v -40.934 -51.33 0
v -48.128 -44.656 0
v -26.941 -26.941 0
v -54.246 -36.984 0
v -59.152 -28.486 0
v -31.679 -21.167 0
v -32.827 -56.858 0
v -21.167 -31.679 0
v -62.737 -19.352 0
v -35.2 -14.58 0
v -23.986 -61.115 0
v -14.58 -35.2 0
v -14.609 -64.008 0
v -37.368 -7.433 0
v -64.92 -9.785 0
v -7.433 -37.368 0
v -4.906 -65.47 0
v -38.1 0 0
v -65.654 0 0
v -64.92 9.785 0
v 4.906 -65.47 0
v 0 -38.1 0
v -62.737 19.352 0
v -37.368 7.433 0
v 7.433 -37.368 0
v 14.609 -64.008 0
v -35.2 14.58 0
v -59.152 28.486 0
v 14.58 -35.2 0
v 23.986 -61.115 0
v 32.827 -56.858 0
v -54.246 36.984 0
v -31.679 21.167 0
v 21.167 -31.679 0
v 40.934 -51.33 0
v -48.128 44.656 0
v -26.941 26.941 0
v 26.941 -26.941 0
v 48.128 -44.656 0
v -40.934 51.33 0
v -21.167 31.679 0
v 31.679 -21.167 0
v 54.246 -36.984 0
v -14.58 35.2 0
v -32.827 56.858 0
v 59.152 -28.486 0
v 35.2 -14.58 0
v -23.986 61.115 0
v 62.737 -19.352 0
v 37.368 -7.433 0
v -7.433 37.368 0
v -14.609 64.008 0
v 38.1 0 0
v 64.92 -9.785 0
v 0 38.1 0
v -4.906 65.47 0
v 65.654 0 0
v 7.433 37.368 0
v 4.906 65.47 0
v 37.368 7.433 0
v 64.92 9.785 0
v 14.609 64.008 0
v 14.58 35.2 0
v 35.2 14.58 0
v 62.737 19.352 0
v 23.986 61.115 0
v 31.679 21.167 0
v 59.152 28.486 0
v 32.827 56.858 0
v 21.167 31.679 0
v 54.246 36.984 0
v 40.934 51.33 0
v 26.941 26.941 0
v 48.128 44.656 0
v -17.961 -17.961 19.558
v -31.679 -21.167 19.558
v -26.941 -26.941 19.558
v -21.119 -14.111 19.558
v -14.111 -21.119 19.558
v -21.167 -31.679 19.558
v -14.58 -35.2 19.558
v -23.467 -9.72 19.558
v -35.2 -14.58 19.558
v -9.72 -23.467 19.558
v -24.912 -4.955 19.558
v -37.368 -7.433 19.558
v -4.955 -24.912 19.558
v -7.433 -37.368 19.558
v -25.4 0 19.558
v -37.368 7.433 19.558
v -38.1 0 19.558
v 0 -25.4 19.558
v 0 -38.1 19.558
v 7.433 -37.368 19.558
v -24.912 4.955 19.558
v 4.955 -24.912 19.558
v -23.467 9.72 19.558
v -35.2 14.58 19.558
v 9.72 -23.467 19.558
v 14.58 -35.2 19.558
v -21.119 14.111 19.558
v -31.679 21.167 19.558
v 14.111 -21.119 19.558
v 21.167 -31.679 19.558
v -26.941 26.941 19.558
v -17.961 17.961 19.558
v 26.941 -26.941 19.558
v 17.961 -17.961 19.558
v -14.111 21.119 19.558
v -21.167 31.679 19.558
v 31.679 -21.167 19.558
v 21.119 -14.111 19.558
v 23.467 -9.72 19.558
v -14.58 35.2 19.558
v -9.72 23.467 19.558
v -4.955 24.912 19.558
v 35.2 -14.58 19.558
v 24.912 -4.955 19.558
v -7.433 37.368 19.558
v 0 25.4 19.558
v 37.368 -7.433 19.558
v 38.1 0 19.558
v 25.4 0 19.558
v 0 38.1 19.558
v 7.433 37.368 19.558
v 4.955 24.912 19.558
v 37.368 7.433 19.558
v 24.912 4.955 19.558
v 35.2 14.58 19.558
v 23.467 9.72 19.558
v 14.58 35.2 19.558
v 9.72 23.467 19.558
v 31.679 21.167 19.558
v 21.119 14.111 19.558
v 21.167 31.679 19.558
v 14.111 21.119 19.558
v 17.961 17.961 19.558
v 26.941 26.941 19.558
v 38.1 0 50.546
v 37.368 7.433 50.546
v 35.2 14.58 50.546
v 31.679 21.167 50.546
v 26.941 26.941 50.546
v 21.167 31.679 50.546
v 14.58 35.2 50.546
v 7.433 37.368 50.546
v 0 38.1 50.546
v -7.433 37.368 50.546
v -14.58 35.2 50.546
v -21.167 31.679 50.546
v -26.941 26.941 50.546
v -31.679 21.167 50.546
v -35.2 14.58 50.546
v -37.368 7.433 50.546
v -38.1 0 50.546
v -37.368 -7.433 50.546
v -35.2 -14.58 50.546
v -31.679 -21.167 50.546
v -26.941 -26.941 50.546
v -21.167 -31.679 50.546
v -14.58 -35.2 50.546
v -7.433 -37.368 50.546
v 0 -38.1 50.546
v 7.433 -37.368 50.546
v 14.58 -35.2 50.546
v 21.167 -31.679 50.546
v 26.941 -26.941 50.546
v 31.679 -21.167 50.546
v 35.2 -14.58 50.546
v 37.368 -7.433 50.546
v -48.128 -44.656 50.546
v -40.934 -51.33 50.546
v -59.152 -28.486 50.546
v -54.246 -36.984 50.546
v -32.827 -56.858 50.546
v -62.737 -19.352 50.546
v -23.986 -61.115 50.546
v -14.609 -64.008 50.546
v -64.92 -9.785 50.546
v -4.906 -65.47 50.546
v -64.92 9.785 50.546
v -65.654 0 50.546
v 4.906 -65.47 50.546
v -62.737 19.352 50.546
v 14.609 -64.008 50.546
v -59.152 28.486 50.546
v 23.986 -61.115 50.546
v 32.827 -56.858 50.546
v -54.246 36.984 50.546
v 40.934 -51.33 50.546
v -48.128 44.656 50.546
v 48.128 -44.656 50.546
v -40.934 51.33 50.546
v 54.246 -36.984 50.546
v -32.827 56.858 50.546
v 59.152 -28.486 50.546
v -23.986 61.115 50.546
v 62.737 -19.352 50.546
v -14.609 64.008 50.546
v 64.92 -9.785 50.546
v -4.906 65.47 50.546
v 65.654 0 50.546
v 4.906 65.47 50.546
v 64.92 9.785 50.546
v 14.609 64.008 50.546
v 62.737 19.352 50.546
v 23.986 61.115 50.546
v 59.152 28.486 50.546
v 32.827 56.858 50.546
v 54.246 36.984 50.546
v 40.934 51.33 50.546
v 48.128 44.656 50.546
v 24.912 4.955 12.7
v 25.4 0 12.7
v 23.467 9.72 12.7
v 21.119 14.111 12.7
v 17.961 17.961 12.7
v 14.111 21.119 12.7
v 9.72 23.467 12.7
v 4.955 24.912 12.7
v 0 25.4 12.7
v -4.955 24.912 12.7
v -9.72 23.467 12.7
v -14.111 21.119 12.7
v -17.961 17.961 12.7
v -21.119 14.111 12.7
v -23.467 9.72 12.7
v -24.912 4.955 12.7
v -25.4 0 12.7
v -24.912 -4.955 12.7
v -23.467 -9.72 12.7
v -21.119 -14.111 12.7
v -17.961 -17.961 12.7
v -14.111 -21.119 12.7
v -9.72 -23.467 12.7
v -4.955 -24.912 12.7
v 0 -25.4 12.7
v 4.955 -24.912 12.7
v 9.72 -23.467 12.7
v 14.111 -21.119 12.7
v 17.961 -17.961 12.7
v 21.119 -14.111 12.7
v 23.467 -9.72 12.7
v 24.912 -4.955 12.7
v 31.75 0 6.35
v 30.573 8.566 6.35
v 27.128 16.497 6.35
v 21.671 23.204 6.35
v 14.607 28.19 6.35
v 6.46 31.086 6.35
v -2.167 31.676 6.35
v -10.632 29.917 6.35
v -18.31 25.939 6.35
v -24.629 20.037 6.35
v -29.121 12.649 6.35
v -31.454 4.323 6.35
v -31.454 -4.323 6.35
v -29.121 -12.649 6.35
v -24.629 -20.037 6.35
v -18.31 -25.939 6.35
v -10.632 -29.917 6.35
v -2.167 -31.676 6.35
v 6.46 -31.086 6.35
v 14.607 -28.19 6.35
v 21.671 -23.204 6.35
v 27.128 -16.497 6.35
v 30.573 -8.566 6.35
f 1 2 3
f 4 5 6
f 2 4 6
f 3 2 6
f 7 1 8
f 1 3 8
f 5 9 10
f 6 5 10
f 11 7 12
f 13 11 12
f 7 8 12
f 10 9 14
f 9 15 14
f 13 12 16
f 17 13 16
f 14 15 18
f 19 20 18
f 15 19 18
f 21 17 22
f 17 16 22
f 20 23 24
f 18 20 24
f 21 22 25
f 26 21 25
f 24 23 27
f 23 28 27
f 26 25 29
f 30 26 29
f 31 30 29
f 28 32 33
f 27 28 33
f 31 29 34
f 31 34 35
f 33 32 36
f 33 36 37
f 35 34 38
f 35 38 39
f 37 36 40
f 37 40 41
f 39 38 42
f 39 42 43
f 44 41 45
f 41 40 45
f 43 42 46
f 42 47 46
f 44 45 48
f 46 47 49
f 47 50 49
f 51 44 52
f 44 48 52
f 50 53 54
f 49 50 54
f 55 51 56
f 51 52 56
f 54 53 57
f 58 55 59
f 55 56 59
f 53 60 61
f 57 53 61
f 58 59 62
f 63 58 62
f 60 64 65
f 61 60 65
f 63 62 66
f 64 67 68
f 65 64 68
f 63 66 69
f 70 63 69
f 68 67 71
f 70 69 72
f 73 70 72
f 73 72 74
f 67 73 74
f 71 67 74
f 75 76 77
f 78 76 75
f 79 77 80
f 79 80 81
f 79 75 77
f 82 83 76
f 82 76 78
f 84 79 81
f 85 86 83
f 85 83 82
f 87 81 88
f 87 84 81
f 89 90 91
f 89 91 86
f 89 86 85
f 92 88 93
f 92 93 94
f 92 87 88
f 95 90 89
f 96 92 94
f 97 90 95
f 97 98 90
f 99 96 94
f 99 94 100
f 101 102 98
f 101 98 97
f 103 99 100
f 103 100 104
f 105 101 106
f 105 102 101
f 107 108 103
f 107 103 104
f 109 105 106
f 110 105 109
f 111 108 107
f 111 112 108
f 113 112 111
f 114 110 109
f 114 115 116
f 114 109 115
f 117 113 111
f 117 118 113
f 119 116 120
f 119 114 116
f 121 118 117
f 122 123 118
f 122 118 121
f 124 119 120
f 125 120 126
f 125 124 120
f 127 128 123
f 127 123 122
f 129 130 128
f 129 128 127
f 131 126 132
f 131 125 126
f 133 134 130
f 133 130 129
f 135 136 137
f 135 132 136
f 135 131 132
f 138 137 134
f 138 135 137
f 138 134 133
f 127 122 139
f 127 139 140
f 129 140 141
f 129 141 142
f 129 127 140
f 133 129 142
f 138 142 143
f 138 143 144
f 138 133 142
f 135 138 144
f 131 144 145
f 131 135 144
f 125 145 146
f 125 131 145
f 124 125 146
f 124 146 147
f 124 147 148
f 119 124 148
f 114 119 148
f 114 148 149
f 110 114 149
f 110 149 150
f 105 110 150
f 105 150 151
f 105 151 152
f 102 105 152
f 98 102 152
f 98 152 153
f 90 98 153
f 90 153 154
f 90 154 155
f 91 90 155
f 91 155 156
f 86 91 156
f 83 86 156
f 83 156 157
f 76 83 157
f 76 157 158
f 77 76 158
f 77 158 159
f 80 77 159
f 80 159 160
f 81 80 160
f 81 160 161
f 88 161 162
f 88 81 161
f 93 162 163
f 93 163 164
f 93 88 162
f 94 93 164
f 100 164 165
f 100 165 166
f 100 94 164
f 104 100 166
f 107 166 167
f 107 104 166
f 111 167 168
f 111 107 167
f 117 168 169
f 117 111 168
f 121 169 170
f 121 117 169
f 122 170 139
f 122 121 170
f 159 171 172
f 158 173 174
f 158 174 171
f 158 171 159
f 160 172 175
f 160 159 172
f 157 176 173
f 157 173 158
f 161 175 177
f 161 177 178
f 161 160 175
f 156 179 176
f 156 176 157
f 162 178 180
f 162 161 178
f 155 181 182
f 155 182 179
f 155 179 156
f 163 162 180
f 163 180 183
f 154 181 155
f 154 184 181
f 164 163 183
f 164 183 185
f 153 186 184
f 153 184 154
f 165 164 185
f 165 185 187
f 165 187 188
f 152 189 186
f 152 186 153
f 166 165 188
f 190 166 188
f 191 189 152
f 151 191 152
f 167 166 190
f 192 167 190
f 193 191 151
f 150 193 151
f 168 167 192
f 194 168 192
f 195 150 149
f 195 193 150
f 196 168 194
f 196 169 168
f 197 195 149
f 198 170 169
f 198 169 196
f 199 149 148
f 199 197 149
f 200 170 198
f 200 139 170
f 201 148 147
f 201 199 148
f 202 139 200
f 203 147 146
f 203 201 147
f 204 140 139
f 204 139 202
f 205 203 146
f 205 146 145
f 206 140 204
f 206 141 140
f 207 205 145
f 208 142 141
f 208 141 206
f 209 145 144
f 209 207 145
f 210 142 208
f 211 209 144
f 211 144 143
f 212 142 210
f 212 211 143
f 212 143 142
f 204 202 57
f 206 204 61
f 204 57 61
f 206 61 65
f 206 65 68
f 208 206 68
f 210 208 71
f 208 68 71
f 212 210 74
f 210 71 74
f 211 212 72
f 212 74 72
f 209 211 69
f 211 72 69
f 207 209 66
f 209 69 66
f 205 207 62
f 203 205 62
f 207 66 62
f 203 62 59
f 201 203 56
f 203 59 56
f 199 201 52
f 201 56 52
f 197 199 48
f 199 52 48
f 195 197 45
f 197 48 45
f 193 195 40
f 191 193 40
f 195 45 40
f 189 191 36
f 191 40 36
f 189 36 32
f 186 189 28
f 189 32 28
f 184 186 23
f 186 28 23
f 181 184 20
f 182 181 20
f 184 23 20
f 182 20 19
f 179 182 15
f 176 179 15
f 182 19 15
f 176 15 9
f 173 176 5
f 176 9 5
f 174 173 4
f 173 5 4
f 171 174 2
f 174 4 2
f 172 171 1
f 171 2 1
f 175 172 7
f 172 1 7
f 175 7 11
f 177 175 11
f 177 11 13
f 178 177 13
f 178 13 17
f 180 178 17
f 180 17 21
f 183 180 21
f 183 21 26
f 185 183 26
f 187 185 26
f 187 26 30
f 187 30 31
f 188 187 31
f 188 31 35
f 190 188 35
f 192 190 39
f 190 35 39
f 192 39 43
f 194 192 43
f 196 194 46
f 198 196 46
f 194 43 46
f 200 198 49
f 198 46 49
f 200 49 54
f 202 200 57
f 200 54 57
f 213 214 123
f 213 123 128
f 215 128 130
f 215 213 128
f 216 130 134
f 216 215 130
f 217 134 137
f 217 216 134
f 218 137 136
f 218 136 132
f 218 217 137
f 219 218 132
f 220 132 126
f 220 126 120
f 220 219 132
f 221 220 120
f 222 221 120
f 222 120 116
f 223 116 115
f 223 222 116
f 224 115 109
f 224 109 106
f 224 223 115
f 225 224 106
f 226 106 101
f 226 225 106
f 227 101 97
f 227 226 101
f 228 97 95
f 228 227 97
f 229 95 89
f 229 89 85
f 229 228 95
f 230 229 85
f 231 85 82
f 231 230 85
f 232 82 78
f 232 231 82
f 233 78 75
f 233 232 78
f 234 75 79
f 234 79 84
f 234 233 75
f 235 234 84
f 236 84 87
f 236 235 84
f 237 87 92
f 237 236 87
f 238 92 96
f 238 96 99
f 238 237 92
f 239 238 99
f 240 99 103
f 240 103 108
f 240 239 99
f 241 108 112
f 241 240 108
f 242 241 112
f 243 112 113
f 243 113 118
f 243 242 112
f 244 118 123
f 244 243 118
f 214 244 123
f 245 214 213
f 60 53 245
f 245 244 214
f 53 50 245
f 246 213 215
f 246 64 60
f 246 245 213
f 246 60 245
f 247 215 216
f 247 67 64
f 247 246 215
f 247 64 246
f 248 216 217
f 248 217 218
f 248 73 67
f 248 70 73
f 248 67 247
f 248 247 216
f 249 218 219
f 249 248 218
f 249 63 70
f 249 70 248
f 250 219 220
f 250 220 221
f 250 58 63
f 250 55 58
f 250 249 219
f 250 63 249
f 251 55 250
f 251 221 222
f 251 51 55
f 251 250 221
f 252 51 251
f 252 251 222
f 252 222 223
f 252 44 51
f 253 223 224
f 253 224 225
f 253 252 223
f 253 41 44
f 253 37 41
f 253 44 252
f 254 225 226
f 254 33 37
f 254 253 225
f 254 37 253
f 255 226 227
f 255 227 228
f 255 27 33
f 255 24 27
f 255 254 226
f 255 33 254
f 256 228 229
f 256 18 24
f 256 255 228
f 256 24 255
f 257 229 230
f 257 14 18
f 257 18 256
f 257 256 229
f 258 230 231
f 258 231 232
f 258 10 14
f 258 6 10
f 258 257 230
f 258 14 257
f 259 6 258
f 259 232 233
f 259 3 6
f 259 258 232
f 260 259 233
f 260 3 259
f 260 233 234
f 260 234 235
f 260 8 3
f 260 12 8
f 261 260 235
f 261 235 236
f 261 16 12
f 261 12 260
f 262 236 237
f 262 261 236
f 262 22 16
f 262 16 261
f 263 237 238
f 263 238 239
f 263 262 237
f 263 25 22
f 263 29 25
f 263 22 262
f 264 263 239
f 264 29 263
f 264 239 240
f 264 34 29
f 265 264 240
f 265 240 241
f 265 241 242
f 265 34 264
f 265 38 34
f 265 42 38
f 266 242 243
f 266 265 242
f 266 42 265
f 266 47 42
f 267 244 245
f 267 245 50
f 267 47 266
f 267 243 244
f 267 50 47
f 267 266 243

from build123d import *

# Parameters (mm, degrees)
F0_R     = 65.653688
F0_R_2   = 38.1
F1_DEPTH = 50.546
F0_R_3   = 25.4
F2_DEPTH = 19.558
F3_SIZE  = 12.7


with BuildPart() as f1:
    # F0 (on Top) → F1 (new body)
    with BuildSketch(Plane.XY):
        Circle(F0_R)
        Circle(F0_R_2, mode=Mode.SUBTRACT)
    extrude(amount=F1_DEPTH)

    # F0 (on Top) → F2 (join)
    with BuildSketch(Plane.XY):
        Circle(F0_R_2)
        Circle(F0_R_3, mode=Mode.SUBTRACT)
    extrude(amount=F2_DEPTH)

    # F3
    f3_edges = [f1.edges().sort_by_distance(p)[0] for p in [
        (-25.4, 0, 0),
    ]]
    chamfer(f3_edges, length=F3_SIZE)


solid = f1.part
